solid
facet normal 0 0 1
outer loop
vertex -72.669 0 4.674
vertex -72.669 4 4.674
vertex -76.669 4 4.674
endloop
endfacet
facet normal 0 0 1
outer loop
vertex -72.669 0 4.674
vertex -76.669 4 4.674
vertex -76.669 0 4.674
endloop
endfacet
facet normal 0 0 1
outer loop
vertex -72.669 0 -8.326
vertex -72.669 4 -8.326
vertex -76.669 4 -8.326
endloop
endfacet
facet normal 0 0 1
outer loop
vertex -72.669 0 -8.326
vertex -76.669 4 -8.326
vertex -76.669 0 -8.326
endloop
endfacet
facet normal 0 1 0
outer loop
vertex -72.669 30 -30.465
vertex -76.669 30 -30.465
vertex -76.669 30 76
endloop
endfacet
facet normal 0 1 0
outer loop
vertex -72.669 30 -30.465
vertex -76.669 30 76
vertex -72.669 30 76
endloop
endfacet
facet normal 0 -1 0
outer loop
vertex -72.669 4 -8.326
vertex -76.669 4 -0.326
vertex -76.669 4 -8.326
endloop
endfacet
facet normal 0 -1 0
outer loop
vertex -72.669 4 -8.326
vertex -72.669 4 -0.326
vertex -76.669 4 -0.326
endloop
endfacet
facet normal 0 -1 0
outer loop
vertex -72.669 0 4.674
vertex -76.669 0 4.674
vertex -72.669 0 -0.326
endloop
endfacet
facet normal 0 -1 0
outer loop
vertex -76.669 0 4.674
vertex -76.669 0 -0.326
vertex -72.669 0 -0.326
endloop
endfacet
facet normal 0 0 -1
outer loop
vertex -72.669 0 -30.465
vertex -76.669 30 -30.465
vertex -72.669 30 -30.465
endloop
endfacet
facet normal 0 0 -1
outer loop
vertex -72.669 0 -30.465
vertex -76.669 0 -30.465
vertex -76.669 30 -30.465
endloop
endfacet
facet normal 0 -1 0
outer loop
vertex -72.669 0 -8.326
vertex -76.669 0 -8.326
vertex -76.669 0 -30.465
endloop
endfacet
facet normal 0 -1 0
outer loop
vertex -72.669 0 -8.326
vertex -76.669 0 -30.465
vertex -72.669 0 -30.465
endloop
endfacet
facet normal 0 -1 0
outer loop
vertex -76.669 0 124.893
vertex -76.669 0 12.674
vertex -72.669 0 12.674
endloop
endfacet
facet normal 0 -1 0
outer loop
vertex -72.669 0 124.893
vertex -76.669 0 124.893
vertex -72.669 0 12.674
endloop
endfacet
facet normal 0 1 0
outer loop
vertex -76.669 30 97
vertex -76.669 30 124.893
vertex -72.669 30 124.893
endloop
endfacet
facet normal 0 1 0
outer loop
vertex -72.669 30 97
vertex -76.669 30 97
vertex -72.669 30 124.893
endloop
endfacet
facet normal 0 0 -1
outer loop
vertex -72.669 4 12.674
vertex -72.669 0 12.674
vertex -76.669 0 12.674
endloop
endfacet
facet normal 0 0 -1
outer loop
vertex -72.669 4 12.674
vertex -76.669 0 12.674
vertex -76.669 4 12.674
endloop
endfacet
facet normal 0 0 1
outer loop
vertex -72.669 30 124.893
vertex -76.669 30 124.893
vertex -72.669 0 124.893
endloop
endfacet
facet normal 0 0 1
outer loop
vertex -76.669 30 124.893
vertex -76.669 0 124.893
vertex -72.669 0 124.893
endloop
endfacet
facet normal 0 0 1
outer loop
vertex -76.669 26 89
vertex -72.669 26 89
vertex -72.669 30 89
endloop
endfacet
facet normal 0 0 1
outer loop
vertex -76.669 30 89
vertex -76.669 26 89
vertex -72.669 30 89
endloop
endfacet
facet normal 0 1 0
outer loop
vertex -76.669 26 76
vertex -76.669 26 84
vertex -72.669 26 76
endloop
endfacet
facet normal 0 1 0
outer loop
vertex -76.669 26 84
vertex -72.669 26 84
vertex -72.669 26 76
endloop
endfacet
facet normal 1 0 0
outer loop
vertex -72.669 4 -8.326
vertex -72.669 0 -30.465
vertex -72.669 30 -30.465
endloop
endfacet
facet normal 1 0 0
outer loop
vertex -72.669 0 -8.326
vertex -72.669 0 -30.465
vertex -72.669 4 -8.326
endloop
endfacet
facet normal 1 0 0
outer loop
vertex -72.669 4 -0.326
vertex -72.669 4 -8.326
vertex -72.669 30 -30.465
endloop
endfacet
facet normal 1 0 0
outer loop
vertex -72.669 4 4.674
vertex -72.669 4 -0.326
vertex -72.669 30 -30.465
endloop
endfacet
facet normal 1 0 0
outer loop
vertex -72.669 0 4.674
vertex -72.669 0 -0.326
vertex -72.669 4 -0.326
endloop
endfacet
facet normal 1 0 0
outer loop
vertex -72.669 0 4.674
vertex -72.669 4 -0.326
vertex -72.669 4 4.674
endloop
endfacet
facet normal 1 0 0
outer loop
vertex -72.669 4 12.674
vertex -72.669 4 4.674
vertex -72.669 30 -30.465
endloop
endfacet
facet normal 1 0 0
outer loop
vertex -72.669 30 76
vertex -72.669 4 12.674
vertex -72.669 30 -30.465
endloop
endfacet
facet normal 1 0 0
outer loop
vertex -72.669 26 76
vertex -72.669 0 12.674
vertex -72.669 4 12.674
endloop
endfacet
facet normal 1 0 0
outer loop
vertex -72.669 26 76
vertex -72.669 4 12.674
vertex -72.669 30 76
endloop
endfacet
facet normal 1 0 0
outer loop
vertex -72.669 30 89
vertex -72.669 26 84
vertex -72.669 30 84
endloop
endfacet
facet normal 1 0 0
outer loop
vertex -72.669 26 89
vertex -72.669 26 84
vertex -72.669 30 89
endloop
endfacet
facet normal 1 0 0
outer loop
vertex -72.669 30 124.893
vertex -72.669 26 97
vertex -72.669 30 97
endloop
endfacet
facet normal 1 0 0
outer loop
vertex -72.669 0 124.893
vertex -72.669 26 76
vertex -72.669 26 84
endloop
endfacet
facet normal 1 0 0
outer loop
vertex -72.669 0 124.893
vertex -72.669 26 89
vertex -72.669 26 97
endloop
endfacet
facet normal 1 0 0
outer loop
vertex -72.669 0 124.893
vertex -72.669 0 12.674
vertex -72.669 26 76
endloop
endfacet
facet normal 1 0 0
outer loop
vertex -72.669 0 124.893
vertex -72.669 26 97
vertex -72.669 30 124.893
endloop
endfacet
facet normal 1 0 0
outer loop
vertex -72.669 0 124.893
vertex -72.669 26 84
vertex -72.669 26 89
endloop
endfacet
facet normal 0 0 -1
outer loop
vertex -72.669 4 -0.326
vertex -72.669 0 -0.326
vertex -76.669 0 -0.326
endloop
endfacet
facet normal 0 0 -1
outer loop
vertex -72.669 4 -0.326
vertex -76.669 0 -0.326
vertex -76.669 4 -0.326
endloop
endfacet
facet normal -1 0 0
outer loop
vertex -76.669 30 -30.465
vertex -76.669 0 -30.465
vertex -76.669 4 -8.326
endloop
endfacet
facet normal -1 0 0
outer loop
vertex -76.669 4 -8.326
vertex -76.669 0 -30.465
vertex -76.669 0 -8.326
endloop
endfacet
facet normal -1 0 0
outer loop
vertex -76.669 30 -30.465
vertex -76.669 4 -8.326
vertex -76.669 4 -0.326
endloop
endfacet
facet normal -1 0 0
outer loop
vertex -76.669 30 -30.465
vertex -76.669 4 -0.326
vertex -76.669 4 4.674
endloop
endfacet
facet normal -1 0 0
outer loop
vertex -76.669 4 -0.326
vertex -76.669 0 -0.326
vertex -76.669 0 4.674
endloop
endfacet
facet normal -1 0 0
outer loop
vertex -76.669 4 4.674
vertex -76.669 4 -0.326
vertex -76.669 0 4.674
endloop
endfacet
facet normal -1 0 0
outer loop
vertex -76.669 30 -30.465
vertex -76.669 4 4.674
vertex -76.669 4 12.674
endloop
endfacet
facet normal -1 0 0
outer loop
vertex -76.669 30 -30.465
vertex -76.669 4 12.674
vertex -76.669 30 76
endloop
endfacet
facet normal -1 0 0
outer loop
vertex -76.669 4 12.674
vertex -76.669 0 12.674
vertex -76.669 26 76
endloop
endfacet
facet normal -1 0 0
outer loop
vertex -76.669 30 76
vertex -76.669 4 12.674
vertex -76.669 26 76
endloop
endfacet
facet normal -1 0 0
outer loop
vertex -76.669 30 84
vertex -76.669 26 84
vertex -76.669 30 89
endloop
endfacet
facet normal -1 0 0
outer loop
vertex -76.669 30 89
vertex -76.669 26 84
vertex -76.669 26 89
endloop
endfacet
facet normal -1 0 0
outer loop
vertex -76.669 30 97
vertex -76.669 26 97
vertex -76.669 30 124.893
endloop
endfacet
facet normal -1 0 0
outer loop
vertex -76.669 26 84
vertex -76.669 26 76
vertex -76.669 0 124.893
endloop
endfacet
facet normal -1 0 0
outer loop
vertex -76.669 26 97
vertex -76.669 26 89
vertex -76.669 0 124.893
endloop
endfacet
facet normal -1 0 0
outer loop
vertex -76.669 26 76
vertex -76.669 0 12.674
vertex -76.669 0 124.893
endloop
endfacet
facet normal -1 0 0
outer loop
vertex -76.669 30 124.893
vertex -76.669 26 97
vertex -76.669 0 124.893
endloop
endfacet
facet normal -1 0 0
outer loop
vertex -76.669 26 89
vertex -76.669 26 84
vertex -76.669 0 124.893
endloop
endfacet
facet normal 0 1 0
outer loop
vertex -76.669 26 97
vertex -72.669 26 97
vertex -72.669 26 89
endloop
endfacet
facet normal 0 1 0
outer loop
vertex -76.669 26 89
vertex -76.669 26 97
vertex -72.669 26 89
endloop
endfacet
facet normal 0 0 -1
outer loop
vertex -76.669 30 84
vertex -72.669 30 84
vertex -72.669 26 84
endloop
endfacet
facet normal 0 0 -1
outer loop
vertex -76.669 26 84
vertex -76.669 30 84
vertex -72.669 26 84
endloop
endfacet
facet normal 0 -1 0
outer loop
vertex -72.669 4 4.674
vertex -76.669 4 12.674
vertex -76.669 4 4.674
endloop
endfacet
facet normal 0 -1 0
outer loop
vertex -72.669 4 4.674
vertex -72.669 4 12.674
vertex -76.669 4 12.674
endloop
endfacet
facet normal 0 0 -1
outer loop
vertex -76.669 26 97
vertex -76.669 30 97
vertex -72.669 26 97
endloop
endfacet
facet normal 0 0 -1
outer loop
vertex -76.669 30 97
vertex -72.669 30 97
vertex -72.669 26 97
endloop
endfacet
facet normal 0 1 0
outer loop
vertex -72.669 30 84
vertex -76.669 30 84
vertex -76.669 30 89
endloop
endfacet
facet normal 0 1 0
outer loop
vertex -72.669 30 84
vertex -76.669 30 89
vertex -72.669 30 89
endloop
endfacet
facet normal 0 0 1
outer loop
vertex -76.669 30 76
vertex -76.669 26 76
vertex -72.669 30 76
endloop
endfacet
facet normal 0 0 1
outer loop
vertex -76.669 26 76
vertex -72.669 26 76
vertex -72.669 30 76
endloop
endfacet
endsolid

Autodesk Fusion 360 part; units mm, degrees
sketch "Boceto1" plane through (0, 0, 0) normal (0, 1, 0) x (1, 0, 0)
  line L0 (-76.6693, 30.4647) -> (-76.6693, -124.8933)
  line L1 (-95, 0) -> (105, 0) construction
  line L2 (-76.6693, 30.4647) -> (-72.6693, 30.4647)
  line L3 (-72.6693, 30.4647) -> (-72.6693, -124.8933)
  line L4 (-76.6693, -124.8933) -> (-72.6693, -124.8933)
  dimension "d59" = 4
extrude "Extruir1" add sketch "Boceto1" along normal blind 30
sketch "Boceto2" plane through (-72.6693, 0, 0) normal (1, 0, 0) x (0, 0, -1)
  line L0 (-124.8933, 0) -> (30.4647, 0)
  line L1 (30.4647, 0) -> (30.4647, 30)
  line L2 (30.4647, 30) -> (-124.8933, 30)
  line L3 (-124.8933, 30) -> (-124.8933, 0)
  line L4 (-76, 30) -> (-84, 30)
  line L5 (-84, 26) -> (-76, 26)
  line L6 (-76, 26) -> (-76, 30)
  line L7 (-89, 30) -> (-97, 30)
  line L8 (-97, 30) -> (-97, 28)
  line L9 (-89, 28) -> (-89, 30)
  line L10 (-97, 26) -> (-89, 26)
  line L11 (-89, 26) -> (-89, 30)
  line L12 (-76, 30) -> (-84, 30)
  line L13 (-97, 30) -> (-97, 26)
  line L14 (8.3256, 0) -> (0.3256, 0)
  line L15 (0.3256, 0) -> (0.3256, 4)
  line L16 (0.3256, 4) -> (8.3256, 4)
  line L17 (8.3256, 4) -> (8.3256, 0)
  line L18 (-4.6744, 0) -> (-12.6744, 0)
  line L19 (-12.6744, 0) -> (-12.6744, 4)
  line L20 (-12.6744, 4) -> (-4.6744, 4)
  line L21 (-4.6744, 4) -> (-4.6744, 0)
  line L22 (-84, 30) -> (-84, 26)
  dimension "d43" = 8
  dimension "d46" = 8
  dimension "d47" = 4
  dimension "d50" = 4
  dimension "d51" = 8
  dimension "d52" = 5
  dimension "d53" = 4
  dimension "d54" = 5
  dimension "d55" = 8
  dimension "d56" = 8
  dimension "d57" = 4
extrude "Extruir2" cut sketch "Boceto2" against normal through all contours L0 L18 L19 L20 L21 | L2 L7 L8 L9 L10 L11 L13 | L0 L14 L15 L16 L17 | L2 L4 L5 L6 L12 L22
sketch "Boceto3" plane through (-72.6693, 0, 0) normal (1, 0, 0) x (0, 0, -1)
  line L0 (-12.6744, 0) -> (-12.6744, 4)
  line L1 (-12.6744, 4) -> (-4.6744, 4)
  line L2 (-4.6744, 4) -> (-4.6744, 0)
  line L3 (-4.6744, 0) -> (0.3256, 0)
  line L4 (0.3256, 0) -> (0.3256, 4)
  line L5 (0.3256, 4) -> (8.3256, 4)
  line L6 (8.3256, 4) -> (8.3256, 0)
  line L7 (8.3256, 0) -> (30.4647, 0)
  line L8 (30.4647, 0) -> (30.4647, 30)
  line L9 (30.4647, 30) -> (-76, 30)
  line L10 (-76, 30) -> (-76, 26)
  line L11 (-76, 26) -> (-84, 26)
  line L12 (-84, 26) -> (-84, 30)
  line L13 (-84, 30) -> (-89, 30)
  line L14 (-89, 30) -> (-89, 26)
  line L15 (-89, 26) -> (-97, 26)
  line L16 (-97, 26) -> (-97, 30)
  line L17 (-97, 30) -> (-124.8933, 30)
  line L18 (-124.8933, 30) -> (-124.8933, 0)
  line L19 (-124.8933, 0) -> (-12.6744, 0)
  line L20 (-4.6744, 0) -> (-4.6744, 4)
  line L21 (-4.6744, 4) -> (-12.6744, 4)
  line L22 (-12.6744, 4) -> (-12.6744, 0)
  line L23 (-97, 30) -> (-97, 26)
  line L24 (-97, 26) -> (-89, 26)
  line L25 (-89, 26) -> (-89, 30)
  line L26 (8.3256, 0) -> (8.3256, 4)
  line L27 (8.3256, 4) -> (0.3256, 4)
  line L28 (0.3256, 4) -> (0.3256, 0)
  line L29 (-84, 30) -> (-84, 26)
  line L30 (-84, 26) -> (-76, 26)
  line L31 (-76, 26) -> (-76, 30)
  line L32 (30.4647, 0) -> (8.3256, 0)
  line L33 (0.3256, 0) -> (-4.6744, 0)
  line L34 (-97, 30) -> (-124.8933, 30)
  line L35 (30.4647, 30) -> (-76, 30)
  line L36 (30.4647, 0) -> (30.4647, 30)
  line L37 (-124.8933, 0) -> (-124.8933, 30)
  line L38 (-12.6744, 0) -> (-124.8933, 0)
  line L39 (-84, 30) -> (-89, 30)
